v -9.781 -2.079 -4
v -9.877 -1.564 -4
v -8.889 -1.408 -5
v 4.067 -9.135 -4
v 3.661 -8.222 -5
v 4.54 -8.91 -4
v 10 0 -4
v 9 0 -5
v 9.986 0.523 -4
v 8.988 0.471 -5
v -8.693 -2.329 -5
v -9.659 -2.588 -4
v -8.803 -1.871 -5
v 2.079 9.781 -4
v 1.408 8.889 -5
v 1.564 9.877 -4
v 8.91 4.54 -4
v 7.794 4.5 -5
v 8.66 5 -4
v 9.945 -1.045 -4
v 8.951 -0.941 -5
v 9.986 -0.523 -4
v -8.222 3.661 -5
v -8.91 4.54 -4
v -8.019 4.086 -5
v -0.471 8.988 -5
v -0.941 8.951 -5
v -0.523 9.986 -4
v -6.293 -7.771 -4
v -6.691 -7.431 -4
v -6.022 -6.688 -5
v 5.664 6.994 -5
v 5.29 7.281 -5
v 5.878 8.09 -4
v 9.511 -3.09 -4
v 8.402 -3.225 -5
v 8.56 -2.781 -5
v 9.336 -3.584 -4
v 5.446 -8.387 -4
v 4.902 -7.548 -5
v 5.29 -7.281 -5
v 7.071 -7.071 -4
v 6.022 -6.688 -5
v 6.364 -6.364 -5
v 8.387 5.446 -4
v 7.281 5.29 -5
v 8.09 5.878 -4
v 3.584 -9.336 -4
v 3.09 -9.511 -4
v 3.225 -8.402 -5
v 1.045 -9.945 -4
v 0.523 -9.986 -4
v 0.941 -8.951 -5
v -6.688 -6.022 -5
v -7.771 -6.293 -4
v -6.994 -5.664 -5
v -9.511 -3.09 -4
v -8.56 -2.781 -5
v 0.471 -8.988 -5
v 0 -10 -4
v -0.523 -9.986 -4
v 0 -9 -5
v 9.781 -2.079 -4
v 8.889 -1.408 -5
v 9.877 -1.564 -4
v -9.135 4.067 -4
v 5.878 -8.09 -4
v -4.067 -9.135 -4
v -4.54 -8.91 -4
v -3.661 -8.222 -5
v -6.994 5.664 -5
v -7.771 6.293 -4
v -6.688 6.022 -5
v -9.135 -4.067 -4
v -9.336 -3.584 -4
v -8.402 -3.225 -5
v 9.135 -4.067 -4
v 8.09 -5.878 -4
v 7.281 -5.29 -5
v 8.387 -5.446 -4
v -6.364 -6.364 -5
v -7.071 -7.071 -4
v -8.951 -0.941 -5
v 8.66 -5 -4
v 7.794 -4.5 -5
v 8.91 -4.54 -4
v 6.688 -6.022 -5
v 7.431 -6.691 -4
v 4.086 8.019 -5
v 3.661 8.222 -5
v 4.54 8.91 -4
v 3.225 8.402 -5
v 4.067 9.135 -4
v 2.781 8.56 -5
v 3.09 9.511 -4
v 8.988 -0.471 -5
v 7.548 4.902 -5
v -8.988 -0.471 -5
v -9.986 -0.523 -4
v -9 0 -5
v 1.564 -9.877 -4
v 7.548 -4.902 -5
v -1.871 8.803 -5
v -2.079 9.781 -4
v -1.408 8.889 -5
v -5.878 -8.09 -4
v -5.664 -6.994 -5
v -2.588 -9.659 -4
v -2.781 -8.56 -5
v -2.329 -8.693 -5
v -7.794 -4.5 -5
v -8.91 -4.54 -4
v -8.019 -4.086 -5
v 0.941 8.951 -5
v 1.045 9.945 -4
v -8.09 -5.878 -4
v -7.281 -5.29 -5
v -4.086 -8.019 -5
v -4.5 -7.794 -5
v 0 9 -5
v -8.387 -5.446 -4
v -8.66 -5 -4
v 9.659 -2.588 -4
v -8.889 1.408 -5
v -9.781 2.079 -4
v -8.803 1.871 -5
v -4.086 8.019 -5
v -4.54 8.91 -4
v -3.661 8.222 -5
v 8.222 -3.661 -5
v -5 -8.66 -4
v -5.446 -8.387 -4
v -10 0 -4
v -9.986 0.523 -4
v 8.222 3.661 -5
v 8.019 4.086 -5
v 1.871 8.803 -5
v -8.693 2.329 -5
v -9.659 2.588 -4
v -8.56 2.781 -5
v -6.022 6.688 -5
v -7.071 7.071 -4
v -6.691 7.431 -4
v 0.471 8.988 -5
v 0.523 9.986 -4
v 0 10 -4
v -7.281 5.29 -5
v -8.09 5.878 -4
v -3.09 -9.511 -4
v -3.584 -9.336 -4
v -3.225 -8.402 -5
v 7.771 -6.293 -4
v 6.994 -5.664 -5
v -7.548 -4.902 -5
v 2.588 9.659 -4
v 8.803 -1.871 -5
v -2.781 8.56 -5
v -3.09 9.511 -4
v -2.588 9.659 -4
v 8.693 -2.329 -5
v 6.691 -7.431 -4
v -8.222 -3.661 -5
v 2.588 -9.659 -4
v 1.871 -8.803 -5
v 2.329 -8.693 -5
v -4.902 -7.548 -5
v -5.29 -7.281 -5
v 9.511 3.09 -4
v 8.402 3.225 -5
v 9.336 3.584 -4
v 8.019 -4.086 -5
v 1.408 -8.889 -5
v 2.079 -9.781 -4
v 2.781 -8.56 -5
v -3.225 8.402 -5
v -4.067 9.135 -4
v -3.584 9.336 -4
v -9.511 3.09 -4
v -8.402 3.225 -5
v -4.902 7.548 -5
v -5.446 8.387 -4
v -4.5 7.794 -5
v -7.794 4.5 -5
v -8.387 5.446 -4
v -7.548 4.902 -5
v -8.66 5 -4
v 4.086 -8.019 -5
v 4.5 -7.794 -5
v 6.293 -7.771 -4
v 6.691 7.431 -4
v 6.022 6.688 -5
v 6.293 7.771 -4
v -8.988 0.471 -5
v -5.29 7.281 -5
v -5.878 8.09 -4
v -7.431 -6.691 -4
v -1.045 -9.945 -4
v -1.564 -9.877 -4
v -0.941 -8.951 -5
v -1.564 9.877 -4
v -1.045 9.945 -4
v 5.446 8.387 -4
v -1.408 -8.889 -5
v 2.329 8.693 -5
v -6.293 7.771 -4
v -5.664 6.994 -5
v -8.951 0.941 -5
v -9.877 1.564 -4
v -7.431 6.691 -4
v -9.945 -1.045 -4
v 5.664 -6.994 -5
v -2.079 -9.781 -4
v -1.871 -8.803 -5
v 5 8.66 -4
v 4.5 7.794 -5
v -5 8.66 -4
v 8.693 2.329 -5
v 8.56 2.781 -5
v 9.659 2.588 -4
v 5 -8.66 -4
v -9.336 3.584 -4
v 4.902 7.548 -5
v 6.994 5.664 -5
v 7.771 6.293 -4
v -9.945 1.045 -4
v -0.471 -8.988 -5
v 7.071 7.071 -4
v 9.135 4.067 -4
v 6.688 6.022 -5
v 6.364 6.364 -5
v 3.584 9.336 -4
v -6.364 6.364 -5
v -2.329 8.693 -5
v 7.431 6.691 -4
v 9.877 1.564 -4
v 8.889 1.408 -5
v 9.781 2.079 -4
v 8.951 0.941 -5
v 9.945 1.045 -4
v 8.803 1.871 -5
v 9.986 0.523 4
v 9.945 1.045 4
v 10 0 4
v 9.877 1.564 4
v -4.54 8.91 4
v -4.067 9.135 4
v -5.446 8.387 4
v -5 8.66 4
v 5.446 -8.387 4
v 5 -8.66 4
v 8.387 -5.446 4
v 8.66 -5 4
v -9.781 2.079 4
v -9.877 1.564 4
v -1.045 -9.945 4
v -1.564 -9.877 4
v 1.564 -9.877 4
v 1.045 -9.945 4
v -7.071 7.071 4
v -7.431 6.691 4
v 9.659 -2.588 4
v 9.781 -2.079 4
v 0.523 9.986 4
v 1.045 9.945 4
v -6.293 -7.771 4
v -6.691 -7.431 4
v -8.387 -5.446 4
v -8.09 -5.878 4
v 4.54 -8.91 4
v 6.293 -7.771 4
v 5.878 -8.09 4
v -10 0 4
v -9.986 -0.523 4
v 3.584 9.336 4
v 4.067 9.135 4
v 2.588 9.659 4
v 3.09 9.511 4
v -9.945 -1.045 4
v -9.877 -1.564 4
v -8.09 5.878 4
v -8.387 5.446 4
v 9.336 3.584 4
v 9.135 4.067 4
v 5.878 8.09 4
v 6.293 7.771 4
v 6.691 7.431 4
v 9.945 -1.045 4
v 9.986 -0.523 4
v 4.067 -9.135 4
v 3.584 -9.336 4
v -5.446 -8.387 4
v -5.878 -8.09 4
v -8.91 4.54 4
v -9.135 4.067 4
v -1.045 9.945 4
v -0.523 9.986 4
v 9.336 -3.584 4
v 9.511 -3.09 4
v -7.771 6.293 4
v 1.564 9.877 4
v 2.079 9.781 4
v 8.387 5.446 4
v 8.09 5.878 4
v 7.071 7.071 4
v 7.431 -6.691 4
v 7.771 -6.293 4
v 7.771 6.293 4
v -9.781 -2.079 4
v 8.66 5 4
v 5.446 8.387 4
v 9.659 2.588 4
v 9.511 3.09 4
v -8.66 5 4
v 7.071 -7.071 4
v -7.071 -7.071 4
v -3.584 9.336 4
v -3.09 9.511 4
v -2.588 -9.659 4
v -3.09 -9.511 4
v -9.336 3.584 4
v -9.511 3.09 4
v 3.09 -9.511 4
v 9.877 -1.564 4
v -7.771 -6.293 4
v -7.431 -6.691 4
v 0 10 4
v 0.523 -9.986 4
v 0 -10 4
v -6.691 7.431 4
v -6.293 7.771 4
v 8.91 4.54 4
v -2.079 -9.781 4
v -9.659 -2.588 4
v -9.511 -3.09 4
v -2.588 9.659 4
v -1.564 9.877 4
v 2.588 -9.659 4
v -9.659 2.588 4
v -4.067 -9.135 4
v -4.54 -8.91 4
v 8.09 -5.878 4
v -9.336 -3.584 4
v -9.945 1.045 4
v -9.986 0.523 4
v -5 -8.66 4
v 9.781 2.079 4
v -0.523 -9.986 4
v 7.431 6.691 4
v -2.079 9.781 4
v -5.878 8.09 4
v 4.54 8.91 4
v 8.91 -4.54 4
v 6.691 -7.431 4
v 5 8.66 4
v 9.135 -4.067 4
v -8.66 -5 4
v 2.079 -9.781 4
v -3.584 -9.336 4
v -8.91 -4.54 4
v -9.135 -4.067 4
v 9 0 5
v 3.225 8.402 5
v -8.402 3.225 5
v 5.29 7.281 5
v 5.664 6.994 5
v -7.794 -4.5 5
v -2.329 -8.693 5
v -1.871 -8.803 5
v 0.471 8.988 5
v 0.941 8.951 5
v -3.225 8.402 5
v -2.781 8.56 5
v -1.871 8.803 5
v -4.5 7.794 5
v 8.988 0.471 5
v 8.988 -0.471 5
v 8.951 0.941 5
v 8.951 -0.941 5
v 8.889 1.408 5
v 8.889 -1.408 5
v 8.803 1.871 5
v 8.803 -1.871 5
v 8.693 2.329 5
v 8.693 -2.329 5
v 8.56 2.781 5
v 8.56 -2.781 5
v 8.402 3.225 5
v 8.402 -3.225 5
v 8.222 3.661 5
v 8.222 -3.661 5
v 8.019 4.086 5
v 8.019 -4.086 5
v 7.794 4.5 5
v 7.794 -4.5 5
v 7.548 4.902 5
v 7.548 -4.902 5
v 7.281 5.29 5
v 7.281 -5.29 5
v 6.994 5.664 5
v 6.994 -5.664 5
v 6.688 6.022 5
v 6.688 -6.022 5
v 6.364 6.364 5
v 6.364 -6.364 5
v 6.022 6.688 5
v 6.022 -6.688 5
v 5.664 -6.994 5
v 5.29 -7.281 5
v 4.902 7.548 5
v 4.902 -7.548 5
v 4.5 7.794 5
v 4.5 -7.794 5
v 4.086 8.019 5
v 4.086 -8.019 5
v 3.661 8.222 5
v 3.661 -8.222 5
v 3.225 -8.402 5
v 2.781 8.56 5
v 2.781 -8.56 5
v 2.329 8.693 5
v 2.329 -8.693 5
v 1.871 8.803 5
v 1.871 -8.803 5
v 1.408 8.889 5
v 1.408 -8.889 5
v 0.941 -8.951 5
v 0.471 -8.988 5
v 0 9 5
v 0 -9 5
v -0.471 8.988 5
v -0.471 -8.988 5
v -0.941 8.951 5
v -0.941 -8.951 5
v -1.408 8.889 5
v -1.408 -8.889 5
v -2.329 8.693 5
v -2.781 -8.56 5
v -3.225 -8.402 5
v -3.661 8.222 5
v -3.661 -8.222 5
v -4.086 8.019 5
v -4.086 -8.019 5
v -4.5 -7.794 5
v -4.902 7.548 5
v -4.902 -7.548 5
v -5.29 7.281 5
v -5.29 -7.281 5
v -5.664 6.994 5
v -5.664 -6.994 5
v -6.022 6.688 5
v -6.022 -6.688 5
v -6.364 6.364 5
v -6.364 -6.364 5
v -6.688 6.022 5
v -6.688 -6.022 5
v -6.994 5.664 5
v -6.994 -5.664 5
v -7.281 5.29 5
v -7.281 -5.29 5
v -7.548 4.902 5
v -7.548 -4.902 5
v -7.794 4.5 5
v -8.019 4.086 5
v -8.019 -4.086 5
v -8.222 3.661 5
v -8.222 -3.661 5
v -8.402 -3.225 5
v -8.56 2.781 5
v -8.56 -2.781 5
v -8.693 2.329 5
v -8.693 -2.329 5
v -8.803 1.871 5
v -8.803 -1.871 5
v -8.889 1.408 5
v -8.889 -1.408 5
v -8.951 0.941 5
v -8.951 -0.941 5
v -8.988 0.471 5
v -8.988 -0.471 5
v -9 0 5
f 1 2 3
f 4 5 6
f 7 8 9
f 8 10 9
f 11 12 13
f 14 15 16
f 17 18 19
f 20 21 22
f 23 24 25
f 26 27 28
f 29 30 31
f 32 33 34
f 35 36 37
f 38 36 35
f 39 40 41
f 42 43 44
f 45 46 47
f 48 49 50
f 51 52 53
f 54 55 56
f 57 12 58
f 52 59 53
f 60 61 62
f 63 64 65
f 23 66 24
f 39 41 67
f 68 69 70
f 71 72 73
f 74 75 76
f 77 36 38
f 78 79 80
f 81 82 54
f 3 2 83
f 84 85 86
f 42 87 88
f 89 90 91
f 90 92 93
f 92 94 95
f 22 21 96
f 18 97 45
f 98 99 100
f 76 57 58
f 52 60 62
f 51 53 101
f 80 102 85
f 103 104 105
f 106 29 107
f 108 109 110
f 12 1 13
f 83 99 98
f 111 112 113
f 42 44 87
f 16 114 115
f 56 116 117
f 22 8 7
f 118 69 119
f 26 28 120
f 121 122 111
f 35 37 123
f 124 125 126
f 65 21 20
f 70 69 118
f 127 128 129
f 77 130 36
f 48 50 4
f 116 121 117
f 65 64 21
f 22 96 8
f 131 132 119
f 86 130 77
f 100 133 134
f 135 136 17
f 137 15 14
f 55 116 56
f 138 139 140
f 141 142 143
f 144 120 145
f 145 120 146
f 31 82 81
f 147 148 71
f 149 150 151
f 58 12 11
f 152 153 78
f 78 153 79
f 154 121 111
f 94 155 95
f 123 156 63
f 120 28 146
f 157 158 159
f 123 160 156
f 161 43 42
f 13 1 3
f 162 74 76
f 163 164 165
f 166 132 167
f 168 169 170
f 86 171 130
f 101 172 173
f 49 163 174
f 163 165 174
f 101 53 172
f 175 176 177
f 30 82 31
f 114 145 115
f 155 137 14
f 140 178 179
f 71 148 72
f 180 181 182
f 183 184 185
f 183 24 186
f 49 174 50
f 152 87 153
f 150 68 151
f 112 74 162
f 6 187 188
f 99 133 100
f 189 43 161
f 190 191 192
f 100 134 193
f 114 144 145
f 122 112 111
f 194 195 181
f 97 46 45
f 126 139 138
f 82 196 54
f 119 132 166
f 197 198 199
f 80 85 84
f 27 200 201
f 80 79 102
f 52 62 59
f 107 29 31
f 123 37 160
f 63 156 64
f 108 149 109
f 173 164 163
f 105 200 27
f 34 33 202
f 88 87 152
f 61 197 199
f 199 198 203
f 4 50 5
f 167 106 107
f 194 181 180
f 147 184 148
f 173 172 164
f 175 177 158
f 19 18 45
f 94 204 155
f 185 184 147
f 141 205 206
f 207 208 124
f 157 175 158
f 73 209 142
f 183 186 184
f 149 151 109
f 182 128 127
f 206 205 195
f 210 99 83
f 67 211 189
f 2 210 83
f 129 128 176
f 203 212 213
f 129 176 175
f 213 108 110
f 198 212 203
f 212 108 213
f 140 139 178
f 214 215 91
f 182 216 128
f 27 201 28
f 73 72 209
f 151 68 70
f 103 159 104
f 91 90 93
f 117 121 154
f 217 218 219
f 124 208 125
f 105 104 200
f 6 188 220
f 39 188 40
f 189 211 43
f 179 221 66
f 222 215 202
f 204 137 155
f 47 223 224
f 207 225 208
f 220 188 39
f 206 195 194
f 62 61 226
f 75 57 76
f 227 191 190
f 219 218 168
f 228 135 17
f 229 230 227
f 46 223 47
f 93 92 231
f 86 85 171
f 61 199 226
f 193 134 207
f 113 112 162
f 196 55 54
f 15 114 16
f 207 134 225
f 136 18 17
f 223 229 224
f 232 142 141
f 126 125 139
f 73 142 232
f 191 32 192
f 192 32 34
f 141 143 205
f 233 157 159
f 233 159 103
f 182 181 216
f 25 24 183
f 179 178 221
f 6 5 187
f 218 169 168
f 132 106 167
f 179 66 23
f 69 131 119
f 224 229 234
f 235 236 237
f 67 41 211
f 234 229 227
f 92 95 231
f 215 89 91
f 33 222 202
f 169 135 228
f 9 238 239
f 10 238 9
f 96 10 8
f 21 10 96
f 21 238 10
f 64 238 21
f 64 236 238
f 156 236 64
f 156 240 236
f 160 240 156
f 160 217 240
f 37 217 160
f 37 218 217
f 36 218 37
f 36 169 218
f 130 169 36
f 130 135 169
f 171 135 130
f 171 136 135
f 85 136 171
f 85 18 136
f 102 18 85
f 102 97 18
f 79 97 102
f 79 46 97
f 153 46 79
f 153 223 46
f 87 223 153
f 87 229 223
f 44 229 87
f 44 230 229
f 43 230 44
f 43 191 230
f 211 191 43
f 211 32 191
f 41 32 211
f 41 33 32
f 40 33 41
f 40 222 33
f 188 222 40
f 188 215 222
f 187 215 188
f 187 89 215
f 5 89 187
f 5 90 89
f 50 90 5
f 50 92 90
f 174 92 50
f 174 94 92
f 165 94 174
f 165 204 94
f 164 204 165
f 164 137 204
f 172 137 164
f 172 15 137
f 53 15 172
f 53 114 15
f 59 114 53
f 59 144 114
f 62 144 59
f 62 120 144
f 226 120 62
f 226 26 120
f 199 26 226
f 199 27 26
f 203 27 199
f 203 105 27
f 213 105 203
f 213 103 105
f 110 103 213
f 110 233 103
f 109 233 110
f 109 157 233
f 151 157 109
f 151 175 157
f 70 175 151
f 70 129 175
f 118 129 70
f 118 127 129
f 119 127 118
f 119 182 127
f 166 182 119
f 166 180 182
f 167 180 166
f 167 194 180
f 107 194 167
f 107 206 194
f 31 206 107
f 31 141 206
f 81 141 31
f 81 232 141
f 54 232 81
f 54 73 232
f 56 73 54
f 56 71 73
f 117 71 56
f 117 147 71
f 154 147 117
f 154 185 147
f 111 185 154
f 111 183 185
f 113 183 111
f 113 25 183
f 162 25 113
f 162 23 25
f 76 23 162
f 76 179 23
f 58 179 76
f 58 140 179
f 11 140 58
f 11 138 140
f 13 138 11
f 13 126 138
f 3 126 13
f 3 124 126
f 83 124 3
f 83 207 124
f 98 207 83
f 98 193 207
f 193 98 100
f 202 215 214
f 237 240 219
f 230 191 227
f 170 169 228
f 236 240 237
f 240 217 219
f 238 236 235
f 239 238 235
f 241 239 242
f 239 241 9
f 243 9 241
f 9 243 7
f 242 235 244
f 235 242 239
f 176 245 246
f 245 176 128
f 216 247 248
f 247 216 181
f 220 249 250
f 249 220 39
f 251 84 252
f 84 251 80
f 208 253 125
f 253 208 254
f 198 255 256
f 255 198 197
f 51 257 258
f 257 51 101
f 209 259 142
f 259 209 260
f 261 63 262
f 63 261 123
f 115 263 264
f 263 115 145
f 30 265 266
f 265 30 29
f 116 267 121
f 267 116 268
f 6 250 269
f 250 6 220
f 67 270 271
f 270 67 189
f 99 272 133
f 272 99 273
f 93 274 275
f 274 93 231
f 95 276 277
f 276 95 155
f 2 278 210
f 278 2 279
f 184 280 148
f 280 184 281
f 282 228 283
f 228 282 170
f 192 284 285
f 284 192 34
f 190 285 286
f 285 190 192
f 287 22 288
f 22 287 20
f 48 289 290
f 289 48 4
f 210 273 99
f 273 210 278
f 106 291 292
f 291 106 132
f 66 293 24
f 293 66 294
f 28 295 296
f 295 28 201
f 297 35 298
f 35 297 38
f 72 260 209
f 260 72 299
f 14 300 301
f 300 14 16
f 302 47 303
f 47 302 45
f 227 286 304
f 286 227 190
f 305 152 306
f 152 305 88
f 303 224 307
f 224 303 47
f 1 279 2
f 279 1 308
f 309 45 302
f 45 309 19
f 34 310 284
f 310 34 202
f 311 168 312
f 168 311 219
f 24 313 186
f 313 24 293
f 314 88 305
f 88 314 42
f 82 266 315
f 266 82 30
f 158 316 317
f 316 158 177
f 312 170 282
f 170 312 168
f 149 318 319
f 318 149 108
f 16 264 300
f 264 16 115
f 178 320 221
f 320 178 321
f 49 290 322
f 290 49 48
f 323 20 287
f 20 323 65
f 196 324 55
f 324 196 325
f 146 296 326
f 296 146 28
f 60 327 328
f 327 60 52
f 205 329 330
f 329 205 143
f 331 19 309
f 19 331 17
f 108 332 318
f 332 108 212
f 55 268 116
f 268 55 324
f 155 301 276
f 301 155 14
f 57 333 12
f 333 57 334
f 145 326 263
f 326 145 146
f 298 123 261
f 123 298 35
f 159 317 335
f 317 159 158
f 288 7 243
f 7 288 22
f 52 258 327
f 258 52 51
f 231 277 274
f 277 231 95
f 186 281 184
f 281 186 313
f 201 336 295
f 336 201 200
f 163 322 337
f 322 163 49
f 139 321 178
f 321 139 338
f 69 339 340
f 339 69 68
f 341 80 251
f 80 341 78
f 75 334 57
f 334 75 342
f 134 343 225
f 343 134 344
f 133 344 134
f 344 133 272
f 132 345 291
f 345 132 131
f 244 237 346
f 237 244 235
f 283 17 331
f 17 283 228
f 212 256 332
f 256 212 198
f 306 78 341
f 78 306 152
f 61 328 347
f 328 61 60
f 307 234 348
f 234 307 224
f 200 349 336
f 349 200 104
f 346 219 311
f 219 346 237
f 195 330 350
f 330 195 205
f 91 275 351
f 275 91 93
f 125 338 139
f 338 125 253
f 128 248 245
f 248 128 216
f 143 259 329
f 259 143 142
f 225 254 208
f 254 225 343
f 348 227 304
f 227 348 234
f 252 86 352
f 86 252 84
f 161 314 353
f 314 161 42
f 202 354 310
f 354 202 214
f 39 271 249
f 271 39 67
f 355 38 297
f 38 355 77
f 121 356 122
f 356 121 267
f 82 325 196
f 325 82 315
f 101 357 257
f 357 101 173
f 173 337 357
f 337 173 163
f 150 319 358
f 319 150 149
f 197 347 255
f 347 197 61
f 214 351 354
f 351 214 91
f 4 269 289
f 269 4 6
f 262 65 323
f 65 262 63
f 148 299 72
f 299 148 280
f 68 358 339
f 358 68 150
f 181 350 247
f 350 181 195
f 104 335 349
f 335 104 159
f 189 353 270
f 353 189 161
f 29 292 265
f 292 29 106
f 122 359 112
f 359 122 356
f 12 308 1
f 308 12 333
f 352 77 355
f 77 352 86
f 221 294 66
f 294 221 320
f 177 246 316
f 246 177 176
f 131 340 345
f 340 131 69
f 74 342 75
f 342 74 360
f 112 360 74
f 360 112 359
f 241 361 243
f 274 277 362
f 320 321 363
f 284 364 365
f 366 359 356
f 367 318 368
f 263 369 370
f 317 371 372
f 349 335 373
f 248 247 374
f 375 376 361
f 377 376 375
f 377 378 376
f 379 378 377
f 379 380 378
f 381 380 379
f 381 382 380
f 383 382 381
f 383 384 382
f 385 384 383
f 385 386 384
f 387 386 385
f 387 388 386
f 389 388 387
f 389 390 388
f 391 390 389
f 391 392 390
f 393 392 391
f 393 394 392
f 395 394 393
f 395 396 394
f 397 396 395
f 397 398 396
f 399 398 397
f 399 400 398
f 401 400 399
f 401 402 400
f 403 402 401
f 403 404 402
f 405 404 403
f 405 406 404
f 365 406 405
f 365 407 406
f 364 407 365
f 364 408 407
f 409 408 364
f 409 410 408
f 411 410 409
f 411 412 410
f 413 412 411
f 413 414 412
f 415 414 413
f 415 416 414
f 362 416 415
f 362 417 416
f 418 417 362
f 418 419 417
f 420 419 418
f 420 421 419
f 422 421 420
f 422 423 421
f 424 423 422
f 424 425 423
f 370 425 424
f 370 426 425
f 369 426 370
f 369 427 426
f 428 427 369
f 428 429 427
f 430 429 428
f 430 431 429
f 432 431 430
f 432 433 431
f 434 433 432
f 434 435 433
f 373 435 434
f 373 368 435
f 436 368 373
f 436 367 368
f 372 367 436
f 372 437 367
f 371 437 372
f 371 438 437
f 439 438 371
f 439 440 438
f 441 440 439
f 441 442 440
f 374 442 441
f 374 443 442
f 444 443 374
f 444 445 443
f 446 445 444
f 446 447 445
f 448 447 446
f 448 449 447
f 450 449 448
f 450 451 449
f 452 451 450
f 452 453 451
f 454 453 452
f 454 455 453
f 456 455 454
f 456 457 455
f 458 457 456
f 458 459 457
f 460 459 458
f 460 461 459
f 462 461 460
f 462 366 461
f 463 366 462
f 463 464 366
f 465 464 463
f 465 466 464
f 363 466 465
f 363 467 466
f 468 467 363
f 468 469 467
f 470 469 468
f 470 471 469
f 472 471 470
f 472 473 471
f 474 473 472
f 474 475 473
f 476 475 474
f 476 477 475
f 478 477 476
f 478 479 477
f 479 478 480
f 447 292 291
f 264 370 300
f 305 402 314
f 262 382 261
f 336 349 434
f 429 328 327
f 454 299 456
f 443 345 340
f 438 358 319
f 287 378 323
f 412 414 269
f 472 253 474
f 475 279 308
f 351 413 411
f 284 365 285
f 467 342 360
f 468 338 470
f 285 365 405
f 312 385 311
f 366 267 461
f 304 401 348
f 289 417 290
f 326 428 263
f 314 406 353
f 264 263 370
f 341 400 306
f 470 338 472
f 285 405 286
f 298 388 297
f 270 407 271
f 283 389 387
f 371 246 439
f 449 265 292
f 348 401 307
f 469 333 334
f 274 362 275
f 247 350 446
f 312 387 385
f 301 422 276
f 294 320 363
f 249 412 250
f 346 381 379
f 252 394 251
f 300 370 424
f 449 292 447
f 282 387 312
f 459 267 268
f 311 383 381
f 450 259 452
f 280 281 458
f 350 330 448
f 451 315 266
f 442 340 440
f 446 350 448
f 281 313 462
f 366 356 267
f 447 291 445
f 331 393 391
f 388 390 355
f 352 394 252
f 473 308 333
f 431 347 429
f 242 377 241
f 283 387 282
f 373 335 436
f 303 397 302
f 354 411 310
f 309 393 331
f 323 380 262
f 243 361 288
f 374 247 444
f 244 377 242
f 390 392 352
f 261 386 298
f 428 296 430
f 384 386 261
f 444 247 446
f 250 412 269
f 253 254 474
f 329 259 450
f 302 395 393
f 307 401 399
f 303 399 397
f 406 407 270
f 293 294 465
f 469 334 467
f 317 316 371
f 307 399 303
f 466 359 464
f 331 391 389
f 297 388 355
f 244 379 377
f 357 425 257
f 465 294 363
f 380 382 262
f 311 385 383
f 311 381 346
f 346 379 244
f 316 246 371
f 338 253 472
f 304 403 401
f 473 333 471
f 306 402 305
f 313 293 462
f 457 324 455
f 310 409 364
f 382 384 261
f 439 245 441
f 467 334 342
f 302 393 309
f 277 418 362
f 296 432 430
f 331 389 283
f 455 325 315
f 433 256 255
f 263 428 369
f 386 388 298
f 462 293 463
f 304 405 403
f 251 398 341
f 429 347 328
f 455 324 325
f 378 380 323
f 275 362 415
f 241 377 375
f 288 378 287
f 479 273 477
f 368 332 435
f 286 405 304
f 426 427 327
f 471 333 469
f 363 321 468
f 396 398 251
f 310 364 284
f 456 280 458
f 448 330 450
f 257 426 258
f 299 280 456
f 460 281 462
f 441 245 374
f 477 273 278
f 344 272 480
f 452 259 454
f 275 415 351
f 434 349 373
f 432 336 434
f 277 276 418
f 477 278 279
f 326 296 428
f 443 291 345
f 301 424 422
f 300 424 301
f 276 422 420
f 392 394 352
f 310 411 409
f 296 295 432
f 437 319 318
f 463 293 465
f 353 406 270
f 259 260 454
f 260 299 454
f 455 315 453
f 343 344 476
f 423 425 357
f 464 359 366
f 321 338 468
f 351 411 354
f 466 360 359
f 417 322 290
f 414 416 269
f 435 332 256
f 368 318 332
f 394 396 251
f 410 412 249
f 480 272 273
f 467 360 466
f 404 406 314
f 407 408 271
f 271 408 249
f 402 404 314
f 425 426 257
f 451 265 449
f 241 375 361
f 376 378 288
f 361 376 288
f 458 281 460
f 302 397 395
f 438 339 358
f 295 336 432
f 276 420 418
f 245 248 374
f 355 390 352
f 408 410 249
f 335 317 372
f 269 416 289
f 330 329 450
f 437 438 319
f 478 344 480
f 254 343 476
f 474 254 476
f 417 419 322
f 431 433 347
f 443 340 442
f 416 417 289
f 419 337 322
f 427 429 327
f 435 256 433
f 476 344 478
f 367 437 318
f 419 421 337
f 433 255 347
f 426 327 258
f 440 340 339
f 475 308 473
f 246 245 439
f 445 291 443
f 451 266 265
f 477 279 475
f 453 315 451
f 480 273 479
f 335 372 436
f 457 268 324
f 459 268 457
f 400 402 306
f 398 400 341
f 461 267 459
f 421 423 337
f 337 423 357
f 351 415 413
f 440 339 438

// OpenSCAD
/* * * * * * * * * * * * * * * * * * * * * * * * * * * * * * * * * * * * *\
 * Copyright (C) Claus Schrammel <claus@f05fk.net>                       *
 *                                                                       *
 * This program is free software: you can redistribute it and/or modify  *
 * it under the terms of the GNU General Public License as published by  *
 * the Free Software Foundation, either version 3 of the License, or     *
 * (at your option) any later version.                                   *
 *                                                                       *
 * This program is distributed in the hope that it will be useful,       *
 * but WITHOUT ANY WARRANTY; without even the implied warranty of        *
 * MERCHANTABILITY or FITNESS FOR A PARTICULAR PURPOSE.  See the         *
 * GNU General Public License for more details.                          *
 *                                                                       *
 * You should have received a copy of the GNU General Public License     *
 * along with this program.  If not, see <http://www.gnu.org/licenses/>. *
 *                                                                       *
 * SPDX-License-Identifier: GPL-3.0-or-later                             *
\* * * * * * * * * * * * * * * * * * * * * * * * * * * * * * * * * * * * */
$fn = 120;

CylinderChamfered(h = 10, d = 20, chamfer = 1, center = true);

module CylinderChamfered(h, d, chamfer, center = false, invert_bottom = false, invert_top = false) {
    d1 = invert_bottom ? d + 2 * chamfer : d - 2 * chamfer;
    d2 = invert_top    ? d + 2 * chamfer : d - 2 * chamfer;
    translate(center == true ? [0, 0, 0] : [0, 0, h / 2])
    union() {
        // bottom
        translate([0, 0, (chamfer - h) / 2])
        cylinder(h = chamfer, d1 = d1, d2 = d, center = true);

        // middle
        cylinder(h = h - 2 * chamfer, d = d, center = true);

        // top
        translate([0, 0, (h - chamfer) / 2])
        cylinder(h = chamfer, d1 = d, d2 = d2, center = true);
    }
}
